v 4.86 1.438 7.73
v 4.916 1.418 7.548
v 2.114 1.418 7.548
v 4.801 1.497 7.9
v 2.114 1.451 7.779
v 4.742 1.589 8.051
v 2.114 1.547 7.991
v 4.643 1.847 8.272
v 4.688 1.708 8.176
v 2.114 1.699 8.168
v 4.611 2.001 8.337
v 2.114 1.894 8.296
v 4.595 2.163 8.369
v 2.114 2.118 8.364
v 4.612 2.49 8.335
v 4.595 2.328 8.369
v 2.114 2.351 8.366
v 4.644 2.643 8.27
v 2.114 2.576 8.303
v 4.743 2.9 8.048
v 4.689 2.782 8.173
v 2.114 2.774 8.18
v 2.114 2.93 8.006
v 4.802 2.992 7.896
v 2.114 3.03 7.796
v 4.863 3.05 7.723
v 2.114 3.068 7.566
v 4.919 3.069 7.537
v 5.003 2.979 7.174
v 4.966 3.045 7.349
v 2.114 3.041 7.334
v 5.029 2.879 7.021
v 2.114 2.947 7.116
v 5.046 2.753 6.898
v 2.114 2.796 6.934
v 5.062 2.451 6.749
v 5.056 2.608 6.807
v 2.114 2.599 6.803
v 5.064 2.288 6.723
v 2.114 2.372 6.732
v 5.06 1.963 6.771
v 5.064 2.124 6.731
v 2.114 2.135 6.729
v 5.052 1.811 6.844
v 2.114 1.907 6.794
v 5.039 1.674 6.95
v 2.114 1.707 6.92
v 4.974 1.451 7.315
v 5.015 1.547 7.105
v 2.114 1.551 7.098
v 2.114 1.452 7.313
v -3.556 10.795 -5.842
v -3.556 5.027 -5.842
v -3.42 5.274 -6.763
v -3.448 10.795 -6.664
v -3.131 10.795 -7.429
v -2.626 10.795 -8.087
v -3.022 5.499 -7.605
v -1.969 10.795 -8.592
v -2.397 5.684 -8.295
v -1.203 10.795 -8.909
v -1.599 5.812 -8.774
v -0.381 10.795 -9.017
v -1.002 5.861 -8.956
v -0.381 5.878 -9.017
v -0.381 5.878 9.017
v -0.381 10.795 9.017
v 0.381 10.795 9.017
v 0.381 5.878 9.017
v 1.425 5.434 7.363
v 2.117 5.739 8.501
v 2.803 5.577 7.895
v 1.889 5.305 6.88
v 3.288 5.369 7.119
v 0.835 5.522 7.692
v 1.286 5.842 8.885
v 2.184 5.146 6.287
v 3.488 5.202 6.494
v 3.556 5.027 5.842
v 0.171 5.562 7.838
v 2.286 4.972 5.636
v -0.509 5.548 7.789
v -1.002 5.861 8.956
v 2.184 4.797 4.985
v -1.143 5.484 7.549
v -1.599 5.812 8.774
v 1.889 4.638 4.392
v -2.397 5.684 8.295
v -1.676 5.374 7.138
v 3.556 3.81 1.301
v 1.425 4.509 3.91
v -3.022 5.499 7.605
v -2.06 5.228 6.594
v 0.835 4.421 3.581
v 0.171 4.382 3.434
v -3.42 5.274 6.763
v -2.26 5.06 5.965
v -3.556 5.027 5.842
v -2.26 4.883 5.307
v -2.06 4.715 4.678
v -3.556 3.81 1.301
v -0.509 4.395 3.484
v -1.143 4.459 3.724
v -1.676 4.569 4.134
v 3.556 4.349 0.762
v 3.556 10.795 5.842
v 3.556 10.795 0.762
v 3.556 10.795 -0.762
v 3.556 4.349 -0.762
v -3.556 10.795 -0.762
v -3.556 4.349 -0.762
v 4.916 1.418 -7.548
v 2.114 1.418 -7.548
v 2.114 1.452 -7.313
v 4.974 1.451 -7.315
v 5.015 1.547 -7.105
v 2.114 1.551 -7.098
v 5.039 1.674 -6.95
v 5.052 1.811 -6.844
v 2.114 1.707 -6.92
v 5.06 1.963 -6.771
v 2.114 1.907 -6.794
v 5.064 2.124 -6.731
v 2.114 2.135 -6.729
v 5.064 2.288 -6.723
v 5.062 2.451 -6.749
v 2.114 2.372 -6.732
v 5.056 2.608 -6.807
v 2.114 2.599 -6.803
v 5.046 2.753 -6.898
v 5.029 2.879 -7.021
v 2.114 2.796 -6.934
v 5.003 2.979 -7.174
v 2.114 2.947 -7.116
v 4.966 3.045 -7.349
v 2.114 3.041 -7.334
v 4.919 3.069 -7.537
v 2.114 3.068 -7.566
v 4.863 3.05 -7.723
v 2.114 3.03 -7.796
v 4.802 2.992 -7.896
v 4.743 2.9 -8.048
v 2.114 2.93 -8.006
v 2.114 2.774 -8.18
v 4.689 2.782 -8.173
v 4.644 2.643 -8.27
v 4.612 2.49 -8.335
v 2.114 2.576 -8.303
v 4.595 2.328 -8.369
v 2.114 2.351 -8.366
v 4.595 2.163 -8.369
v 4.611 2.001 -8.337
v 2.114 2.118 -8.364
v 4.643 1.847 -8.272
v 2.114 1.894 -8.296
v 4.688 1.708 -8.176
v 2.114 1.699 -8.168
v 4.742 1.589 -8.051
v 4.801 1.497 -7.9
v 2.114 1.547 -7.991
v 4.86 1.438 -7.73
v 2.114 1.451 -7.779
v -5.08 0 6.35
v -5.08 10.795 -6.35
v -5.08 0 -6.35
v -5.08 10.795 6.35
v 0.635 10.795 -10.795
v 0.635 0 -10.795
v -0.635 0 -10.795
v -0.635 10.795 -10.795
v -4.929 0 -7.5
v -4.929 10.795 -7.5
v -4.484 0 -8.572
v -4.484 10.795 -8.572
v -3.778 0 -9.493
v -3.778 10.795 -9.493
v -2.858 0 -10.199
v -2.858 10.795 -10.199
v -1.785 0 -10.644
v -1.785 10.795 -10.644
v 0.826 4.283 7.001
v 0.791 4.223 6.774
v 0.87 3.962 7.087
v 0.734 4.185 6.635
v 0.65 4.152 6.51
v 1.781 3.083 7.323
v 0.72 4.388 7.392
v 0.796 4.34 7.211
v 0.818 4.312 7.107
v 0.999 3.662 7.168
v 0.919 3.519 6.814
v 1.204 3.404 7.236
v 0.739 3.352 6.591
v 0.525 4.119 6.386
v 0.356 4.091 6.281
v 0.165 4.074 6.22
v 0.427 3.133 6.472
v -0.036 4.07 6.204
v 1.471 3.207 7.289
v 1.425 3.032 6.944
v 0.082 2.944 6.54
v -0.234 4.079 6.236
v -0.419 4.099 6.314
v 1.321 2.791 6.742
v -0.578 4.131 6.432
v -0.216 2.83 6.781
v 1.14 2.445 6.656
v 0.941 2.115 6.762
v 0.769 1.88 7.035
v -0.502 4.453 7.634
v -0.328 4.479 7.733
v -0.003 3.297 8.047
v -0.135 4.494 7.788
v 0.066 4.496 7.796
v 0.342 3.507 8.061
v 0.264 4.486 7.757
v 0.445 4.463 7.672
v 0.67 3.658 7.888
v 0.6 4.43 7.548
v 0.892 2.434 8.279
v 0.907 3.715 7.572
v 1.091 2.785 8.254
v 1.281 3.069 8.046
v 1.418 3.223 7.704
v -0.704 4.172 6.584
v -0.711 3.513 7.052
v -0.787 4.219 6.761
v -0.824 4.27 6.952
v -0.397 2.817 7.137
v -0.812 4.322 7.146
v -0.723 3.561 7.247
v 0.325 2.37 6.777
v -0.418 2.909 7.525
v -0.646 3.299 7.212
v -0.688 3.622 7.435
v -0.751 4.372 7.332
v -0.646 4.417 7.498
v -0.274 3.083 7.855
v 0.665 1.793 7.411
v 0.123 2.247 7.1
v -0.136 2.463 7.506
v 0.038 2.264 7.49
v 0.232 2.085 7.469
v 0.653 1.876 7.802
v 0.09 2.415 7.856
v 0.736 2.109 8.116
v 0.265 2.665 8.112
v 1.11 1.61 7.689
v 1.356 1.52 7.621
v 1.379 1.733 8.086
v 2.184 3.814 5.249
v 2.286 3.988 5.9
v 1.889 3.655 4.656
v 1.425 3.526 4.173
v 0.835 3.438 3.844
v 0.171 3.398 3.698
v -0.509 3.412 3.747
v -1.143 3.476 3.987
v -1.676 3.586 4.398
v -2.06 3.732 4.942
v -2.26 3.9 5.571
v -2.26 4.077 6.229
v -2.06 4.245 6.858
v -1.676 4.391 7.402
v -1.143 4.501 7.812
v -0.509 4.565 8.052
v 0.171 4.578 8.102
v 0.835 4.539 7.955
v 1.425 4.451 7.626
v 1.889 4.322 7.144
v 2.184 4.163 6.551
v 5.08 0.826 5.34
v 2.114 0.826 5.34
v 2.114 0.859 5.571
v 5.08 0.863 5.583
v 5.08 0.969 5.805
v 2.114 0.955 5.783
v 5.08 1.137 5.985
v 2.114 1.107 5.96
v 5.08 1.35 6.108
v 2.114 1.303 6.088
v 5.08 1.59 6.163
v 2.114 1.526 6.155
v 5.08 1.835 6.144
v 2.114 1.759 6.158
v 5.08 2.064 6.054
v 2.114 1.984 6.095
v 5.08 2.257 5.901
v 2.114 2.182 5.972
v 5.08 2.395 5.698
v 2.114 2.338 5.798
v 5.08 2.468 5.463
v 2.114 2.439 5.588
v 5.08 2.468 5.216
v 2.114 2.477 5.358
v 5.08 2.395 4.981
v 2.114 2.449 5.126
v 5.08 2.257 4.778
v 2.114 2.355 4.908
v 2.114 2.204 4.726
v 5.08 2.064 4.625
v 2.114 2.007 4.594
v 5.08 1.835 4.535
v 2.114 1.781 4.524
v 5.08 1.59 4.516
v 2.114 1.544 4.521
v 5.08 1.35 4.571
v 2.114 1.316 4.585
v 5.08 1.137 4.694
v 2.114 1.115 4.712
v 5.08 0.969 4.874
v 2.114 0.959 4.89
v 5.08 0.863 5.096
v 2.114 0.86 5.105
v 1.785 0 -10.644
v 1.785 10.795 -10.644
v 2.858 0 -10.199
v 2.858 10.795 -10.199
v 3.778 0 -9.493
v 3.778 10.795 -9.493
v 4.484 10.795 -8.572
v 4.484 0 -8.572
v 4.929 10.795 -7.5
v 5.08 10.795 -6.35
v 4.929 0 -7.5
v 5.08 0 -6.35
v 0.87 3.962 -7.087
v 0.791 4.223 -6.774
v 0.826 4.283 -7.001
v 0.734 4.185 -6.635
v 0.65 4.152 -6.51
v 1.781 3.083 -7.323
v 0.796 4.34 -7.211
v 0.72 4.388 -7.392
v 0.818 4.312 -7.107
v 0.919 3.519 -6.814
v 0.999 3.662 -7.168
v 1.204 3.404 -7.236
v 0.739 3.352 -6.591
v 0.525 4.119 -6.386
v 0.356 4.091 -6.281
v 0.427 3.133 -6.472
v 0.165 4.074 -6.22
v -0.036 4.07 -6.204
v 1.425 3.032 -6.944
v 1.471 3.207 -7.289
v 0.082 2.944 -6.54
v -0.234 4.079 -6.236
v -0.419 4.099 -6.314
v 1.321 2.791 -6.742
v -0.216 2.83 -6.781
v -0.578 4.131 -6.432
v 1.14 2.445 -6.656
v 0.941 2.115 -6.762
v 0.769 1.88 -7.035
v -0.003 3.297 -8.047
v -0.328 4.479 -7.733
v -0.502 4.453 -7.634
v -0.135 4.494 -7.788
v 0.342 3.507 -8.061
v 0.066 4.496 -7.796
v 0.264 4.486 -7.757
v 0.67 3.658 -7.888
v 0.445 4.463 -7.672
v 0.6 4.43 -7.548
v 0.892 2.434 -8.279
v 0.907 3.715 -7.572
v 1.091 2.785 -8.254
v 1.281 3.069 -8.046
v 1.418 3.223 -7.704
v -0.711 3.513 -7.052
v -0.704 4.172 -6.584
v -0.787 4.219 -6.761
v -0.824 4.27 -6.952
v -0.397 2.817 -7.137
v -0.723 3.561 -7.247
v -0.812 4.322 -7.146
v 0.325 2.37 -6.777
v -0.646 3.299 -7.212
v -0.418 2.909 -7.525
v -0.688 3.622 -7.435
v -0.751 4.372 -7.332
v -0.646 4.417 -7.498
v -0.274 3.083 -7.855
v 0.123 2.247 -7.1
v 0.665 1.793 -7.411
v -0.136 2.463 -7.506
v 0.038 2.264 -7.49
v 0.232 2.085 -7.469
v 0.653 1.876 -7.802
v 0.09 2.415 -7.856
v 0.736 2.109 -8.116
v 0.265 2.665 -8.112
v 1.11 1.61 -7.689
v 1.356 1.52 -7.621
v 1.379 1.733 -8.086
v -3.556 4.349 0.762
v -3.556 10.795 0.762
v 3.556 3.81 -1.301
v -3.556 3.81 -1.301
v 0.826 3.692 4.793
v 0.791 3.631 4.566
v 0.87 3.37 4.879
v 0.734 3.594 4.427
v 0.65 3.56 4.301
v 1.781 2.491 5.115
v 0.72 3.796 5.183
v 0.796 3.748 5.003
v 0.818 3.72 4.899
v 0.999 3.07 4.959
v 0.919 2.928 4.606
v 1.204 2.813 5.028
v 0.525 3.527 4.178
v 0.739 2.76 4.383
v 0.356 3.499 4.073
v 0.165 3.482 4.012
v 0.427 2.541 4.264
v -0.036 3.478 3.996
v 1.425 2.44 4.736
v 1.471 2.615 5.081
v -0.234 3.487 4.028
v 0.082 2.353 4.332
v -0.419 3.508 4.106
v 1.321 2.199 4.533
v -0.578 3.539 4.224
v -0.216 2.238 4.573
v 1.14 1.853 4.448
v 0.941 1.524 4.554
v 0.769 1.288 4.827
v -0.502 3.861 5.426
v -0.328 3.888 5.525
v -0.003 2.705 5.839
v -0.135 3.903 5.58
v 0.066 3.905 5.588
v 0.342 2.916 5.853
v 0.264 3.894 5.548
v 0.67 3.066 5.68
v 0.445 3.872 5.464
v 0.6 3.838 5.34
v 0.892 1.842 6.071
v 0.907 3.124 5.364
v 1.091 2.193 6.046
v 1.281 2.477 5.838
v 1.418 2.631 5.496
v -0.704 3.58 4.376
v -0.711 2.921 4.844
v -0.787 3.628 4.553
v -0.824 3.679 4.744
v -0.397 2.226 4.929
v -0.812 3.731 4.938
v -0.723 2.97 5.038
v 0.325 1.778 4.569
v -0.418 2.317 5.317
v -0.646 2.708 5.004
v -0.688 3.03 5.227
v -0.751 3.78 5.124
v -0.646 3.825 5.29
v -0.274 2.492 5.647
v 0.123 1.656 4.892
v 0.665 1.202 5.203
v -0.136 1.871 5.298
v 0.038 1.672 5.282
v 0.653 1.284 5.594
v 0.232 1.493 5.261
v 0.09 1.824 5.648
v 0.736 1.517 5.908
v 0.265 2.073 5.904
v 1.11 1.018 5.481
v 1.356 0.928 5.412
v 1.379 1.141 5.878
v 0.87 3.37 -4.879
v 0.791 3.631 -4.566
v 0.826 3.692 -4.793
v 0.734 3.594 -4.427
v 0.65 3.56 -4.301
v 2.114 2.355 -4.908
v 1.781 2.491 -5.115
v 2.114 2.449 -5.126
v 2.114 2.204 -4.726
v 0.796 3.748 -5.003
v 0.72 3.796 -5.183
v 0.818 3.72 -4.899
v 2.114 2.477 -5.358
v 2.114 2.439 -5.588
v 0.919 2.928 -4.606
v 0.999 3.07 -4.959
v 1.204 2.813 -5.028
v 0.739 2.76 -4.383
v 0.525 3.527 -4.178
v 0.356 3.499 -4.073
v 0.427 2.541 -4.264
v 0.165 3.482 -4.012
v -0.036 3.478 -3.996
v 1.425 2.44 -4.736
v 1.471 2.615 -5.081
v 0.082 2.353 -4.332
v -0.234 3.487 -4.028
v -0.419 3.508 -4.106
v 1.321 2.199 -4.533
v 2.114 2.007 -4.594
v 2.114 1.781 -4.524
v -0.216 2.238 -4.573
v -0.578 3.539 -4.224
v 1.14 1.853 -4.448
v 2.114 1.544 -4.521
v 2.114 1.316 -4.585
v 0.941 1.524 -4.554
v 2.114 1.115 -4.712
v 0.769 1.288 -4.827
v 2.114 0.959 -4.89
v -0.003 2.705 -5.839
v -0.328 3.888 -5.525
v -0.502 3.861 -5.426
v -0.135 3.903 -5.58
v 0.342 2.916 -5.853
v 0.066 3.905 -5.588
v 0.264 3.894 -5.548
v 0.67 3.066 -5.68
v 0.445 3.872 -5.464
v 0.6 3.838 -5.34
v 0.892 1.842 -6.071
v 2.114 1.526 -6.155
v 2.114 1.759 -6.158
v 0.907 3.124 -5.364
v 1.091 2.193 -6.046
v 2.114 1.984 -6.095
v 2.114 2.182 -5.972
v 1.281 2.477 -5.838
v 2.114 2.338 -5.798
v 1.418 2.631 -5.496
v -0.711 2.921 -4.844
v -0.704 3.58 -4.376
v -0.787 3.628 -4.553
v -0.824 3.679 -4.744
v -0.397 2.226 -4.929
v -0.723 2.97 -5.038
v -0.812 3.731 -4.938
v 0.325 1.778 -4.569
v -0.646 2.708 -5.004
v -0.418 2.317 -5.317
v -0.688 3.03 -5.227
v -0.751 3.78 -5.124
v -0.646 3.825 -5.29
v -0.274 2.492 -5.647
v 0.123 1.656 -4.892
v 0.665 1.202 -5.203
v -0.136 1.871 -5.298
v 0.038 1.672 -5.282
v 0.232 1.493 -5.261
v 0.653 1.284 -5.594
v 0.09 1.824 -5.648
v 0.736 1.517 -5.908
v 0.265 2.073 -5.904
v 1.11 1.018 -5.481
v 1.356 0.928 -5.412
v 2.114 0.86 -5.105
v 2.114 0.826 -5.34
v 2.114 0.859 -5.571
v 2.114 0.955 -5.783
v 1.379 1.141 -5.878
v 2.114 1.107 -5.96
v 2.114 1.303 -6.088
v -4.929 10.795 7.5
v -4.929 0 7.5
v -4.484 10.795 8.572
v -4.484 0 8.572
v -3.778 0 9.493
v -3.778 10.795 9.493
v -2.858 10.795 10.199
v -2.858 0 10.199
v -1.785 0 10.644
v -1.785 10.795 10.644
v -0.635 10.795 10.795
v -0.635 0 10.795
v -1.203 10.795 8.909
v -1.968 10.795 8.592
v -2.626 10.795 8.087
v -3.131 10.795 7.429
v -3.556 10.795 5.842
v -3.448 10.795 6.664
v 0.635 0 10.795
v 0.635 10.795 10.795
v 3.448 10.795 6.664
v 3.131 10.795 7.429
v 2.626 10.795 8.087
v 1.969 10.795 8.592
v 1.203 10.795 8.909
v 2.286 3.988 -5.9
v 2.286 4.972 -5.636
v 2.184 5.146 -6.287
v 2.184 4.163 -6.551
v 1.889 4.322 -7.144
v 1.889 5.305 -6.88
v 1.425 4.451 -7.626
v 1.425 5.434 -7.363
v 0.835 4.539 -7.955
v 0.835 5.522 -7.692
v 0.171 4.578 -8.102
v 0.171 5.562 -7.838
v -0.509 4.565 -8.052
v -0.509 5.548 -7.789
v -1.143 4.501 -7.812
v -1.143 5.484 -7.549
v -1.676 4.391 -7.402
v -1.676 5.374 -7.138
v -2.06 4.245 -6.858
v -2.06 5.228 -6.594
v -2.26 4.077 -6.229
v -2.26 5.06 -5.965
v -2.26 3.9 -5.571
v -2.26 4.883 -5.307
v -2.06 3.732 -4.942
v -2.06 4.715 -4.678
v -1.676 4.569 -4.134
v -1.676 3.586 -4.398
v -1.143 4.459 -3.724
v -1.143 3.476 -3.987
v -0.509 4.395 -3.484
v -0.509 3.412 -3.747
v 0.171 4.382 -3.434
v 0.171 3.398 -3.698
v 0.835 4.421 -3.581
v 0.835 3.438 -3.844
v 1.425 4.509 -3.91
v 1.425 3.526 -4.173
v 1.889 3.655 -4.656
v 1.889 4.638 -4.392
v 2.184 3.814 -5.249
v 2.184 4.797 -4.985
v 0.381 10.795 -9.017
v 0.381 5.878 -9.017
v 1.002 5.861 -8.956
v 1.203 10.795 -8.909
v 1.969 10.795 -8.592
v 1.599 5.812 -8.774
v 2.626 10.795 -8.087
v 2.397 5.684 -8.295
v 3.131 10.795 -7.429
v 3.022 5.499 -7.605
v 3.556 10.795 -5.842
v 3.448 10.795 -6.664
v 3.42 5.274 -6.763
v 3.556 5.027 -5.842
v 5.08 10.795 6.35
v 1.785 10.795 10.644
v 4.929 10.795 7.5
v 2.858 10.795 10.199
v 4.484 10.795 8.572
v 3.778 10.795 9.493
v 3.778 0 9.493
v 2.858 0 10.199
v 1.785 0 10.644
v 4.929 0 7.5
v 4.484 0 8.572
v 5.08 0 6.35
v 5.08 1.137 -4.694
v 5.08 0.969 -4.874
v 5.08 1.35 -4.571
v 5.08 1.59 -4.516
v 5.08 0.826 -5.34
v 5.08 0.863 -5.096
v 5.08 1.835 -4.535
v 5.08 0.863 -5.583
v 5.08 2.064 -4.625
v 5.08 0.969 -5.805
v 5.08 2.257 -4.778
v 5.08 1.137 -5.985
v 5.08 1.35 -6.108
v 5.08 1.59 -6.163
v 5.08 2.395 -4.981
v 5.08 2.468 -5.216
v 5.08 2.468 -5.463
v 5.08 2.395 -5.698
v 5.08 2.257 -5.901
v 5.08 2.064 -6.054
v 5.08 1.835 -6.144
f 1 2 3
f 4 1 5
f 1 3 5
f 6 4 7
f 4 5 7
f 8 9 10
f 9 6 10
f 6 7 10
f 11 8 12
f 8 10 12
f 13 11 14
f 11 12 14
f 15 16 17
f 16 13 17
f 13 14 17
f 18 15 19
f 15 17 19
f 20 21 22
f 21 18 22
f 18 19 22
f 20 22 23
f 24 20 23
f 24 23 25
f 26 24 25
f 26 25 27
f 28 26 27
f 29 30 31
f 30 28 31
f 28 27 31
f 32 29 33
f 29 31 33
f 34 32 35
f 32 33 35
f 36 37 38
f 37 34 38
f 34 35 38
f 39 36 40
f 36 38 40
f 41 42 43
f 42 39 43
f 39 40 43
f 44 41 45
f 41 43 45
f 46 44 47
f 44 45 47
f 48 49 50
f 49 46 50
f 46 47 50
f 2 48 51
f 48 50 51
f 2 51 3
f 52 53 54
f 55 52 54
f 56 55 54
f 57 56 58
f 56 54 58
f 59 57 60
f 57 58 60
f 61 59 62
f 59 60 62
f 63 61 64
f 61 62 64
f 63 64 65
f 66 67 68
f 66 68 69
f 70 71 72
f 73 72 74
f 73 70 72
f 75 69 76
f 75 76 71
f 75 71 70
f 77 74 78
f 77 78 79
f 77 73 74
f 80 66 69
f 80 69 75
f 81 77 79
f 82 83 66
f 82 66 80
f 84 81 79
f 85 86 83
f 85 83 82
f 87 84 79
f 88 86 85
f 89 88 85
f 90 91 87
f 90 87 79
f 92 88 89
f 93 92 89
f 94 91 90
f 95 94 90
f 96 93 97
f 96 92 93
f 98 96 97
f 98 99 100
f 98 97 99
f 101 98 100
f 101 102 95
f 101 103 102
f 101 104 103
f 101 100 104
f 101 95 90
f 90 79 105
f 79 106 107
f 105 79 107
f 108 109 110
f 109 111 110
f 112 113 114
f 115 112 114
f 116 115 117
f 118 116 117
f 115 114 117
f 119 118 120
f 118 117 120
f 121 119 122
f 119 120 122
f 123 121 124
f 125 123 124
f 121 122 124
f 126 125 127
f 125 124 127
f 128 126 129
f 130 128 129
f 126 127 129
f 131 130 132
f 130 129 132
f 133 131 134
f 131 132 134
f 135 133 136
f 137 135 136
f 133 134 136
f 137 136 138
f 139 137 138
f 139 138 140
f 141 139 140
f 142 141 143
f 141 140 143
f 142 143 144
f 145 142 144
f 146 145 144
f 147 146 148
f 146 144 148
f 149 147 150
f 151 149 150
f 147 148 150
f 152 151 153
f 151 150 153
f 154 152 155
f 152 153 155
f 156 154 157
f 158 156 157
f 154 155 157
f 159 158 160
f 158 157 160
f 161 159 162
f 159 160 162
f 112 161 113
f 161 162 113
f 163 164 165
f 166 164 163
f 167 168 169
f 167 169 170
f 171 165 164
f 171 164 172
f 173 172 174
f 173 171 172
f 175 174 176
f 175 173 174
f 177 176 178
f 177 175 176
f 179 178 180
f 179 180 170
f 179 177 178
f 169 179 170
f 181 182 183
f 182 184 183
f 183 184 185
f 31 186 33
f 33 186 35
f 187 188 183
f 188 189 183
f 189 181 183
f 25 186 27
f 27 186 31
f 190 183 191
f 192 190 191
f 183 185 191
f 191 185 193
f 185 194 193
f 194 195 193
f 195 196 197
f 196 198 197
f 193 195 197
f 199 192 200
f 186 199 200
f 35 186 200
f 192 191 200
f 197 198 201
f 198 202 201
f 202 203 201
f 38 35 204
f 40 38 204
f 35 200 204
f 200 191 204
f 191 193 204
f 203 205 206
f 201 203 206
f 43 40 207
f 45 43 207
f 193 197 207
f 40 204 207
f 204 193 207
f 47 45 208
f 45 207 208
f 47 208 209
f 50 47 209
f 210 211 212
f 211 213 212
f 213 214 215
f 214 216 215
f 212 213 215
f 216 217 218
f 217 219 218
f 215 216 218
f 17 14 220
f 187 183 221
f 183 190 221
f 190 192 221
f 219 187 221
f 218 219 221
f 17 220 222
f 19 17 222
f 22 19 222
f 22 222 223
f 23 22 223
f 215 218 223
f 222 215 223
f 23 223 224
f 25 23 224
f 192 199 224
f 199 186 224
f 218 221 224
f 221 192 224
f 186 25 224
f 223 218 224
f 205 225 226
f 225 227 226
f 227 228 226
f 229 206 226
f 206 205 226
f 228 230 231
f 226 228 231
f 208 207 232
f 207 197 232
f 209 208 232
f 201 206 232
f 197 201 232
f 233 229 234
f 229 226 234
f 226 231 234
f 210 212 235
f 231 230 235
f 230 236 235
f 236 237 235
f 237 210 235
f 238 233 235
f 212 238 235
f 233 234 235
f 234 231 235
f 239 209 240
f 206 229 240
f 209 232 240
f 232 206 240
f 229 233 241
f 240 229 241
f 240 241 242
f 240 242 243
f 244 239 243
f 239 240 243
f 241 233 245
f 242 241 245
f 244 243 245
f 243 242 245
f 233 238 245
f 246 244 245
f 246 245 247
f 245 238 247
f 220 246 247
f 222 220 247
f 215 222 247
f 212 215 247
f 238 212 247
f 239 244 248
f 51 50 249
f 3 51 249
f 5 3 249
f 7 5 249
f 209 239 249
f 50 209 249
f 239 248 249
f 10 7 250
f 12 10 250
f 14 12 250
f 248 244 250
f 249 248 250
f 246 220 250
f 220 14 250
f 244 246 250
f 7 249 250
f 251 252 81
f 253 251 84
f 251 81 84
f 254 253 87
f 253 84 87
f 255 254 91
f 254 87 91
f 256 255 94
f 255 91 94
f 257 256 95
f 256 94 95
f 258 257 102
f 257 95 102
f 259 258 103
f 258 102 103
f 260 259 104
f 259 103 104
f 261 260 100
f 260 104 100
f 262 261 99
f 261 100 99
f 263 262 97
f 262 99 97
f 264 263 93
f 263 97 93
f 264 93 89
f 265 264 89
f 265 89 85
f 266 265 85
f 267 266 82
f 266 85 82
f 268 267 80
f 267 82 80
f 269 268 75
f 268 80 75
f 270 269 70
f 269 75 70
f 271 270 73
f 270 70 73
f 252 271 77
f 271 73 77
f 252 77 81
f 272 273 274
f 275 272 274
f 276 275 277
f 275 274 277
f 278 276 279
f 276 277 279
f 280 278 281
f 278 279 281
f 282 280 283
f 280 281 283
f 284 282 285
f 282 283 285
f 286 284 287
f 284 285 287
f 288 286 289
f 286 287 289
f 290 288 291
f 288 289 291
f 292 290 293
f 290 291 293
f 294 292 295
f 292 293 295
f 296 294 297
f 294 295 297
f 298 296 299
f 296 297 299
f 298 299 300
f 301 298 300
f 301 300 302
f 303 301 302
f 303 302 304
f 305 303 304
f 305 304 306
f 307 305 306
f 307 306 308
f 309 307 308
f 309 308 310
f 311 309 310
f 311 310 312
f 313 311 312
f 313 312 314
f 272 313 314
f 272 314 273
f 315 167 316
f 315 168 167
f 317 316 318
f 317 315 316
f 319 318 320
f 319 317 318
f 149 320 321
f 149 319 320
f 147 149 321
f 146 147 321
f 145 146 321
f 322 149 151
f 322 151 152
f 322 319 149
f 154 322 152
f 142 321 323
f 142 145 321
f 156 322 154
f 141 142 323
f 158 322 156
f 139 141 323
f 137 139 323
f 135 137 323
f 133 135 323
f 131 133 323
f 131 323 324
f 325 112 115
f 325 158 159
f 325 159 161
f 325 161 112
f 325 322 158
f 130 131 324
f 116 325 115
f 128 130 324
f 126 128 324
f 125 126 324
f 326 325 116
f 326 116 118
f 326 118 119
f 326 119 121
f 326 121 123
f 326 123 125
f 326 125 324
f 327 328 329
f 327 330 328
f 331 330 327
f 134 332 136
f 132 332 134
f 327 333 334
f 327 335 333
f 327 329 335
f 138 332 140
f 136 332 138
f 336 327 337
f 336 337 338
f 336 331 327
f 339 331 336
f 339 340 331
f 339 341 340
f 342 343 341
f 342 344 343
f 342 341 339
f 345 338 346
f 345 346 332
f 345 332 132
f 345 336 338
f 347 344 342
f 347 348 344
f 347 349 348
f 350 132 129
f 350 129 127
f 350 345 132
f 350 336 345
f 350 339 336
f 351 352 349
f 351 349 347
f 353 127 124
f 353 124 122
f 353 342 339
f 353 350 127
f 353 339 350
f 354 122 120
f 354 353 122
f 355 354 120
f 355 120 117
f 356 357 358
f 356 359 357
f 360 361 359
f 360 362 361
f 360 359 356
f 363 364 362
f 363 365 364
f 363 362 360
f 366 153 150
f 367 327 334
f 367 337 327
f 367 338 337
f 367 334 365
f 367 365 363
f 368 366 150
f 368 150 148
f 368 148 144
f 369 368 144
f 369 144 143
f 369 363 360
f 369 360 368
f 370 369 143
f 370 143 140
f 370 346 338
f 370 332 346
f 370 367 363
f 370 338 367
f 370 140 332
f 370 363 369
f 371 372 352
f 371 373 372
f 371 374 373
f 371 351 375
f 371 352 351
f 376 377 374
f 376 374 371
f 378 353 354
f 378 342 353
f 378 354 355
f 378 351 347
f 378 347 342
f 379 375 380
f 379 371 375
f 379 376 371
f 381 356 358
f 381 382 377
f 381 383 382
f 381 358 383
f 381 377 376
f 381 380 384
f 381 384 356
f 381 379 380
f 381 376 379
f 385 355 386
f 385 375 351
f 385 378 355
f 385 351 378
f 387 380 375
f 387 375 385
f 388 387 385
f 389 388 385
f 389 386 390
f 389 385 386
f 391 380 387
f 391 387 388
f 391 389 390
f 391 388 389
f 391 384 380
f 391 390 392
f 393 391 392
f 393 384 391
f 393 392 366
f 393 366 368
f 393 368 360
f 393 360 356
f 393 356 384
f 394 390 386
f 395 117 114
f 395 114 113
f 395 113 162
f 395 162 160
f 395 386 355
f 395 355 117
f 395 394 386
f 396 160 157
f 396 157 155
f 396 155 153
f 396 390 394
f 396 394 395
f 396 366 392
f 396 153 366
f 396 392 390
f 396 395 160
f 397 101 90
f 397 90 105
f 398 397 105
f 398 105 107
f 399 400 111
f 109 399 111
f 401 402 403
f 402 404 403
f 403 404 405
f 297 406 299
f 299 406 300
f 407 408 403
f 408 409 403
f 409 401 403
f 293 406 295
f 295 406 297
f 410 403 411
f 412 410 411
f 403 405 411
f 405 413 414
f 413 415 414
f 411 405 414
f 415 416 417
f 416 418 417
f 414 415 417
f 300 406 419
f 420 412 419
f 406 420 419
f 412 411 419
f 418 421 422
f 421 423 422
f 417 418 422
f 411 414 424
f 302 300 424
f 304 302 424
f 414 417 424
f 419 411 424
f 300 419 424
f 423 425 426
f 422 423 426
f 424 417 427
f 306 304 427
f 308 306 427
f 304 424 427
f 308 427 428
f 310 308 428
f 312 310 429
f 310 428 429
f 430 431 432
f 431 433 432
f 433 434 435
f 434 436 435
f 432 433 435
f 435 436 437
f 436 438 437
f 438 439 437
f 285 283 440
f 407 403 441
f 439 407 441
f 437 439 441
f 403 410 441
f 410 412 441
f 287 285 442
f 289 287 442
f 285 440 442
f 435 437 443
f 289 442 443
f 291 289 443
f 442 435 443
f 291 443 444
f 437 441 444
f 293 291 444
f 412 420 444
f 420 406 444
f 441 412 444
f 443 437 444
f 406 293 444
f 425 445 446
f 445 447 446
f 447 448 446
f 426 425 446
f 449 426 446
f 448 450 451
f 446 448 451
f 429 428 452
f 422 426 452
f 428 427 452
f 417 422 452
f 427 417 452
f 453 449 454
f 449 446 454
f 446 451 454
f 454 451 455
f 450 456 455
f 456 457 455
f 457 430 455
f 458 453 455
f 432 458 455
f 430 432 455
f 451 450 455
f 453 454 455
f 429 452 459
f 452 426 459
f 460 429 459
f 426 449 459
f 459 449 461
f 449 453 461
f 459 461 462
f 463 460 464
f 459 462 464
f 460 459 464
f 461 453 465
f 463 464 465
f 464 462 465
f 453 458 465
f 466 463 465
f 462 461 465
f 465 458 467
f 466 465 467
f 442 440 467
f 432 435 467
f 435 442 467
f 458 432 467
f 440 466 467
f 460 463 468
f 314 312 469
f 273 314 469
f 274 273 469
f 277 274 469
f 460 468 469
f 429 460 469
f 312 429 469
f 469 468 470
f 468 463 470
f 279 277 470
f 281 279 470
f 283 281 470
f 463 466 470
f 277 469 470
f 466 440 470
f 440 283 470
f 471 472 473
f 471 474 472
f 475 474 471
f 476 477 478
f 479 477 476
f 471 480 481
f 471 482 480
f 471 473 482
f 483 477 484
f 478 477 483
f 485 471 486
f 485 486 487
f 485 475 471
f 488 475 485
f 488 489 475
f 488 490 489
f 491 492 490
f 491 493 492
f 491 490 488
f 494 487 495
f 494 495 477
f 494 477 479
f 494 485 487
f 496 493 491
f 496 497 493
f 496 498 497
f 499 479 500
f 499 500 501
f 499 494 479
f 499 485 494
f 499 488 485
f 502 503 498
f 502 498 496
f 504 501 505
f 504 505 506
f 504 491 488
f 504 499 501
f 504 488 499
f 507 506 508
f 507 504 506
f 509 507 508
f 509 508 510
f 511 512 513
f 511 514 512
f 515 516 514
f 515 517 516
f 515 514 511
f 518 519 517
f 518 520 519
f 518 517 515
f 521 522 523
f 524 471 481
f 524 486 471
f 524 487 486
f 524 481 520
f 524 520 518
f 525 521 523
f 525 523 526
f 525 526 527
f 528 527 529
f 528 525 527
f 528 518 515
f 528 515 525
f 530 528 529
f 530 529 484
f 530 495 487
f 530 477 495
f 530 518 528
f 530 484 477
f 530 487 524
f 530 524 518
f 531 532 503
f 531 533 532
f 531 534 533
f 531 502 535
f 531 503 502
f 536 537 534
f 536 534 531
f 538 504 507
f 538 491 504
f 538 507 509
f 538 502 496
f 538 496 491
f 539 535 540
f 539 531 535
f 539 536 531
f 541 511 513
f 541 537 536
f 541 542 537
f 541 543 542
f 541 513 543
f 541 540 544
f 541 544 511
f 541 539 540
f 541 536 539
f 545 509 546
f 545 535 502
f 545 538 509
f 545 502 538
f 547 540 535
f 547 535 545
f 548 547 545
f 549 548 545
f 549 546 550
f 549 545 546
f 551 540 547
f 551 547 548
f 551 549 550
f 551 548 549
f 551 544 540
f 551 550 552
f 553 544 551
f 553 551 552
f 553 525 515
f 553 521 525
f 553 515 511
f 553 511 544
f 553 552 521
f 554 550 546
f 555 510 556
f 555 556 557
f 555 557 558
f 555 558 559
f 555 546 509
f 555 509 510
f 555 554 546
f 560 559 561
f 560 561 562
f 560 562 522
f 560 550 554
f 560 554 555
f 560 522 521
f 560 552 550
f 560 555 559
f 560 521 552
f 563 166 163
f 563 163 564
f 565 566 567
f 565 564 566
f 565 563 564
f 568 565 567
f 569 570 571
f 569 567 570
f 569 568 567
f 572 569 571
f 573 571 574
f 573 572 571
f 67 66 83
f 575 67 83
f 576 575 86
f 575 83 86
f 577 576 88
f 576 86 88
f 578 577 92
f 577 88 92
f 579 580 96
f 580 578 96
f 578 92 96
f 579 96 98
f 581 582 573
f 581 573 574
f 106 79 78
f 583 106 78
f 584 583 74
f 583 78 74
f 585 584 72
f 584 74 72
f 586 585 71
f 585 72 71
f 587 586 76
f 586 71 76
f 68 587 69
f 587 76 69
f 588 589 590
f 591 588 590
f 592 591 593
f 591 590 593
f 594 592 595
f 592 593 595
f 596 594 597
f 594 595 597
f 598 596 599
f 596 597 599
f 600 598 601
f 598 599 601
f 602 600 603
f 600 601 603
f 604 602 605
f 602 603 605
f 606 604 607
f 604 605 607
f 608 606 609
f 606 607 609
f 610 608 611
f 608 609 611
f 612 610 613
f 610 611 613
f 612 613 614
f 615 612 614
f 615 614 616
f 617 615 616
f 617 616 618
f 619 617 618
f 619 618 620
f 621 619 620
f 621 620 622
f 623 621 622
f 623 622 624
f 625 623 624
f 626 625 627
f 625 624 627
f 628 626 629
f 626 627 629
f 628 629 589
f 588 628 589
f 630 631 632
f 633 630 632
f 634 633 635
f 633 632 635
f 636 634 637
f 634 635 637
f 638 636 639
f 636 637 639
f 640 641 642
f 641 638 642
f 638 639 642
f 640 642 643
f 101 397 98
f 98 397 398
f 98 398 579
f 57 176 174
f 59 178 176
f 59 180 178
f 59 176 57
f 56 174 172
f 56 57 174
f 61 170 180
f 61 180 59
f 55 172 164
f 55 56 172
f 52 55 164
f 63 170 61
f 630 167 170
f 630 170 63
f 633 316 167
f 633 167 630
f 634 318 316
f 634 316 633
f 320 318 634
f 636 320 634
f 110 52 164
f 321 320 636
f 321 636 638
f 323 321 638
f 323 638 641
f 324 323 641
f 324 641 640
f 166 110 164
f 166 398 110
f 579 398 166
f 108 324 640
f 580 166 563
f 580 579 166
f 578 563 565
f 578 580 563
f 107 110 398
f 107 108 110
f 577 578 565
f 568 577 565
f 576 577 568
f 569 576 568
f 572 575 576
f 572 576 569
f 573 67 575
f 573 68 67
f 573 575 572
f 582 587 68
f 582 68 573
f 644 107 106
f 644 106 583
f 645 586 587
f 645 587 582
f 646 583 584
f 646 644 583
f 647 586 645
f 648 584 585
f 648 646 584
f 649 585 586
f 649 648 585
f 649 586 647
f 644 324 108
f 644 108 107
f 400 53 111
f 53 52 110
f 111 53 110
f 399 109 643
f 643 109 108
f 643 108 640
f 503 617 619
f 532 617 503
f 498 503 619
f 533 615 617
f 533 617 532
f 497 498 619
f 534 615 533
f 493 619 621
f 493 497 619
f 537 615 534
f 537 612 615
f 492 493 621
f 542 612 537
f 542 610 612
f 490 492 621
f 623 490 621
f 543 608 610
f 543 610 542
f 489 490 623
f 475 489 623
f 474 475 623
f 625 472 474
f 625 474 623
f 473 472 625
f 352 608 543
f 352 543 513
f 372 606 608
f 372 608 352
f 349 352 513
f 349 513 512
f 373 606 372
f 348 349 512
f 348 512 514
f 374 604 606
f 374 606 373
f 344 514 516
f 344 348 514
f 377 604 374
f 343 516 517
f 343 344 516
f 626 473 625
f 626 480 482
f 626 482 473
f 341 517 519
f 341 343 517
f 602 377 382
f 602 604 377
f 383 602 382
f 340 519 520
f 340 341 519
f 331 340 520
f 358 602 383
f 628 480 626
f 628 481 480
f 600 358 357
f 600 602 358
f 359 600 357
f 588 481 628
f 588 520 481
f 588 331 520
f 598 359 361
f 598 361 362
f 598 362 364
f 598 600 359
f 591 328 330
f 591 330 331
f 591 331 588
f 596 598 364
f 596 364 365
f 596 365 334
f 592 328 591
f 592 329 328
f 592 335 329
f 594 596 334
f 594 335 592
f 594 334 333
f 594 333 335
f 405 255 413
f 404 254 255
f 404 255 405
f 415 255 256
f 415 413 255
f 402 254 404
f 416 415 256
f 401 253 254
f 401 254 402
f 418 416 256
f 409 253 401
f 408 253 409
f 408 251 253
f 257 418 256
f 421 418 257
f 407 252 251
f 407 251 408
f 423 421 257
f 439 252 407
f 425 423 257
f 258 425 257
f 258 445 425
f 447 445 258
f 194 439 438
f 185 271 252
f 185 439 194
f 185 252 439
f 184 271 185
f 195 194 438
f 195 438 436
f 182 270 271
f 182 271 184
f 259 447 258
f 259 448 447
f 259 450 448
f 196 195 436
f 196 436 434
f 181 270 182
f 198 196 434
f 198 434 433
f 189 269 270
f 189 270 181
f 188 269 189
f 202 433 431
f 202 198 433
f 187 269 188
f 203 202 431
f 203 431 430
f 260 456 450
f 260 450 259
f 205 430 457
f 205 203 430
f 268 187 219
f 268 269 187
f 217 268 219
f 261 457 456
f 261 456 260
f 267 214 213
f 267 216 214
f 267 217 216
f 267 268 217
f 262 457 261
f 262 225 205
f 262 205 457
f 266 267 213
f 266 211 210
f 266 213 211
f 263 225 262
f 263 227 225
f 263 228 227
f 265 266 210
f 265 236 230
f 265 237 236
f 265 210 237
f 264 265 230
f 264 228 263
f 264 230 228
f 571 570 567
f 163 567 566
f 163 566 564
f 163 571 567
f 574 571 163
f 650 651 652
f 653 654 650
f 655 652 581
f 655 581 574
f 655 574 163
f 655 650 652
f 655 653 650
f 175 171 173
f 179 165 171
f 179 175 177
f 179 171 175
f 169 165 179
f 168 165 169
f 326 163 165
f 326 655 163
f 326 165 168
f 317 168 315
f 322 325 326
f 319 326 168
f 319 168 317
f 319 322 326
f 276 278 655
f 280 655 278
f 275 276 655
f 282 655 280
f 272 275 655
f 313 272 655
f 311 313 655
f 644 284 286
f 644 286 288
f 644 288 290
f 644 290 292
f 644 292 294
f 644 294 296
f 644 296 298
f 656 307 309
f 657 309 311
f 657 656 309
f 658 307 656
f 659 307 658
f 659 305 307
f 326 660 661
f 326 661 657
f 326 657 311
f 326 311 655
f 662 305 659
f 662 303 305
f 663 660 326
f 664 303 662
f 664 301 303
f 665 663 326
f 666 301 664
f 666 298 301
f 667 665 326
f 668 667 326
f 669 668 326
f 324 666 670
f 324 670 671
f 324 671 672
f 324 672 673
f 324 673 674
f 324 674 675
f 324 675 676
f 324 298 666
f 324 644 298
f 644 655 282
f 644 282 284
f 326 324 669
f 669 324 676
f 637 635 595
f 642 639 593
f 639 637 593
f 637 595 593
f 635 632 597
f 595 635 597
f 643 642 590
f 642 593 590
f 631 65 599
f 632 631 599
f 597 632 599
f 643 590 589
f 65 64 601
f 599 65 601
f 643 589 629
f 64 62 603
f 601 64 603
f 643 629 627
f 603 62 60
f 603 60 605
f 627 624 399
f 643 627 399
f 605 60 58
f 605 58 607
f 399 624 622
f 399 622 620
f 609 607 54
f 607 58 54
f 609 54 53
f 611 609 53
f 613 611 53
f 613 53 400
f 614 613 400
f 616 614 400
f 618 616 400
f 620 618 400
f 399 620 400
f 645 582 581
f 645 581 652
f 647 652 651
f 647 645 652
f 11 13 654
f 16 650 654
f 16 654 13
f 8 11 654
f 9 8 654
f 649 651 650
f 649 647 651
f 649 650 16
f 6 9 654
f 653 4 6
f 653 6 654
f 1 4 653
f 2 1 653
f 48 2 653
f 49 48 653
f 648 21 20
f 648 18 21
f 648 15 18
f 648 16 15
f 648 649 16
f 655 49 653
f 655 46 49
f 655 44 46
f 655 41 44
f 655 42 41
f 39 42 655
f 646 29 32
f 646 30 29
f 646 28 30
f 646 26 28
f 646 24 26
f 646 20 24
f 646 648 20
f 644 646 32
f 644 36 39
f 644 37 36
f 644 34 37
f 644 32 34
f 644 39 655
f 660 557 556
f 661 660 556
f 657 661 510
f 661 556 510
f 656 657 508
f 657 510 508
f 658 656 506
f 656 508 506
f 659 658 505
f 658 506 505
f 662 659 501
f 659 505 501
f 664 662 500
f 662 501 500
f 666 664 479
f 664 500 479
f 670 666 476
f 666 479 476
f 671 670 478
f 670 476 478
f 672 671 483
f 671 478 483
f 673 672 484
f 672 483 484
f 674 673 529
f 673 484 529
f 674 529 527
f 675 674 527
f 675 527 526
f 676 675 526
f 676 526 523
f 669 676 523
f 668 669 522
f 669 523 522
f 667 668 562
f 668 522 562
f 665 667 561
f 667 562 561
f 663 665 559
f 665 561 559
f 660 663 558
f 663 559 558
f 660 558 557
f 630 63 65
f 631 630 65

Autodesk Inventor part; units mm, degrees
ref_plane "YZ Plane" through (0, 0, 0) normal (1, 0, 0) x (0, 1, 0)
ref_plane "XZ Plane" through (0, 0, 0) normal (0, 1, 0) x (-1, 0, 0)
sketch "Sketch1" plane through (0, 0, 0) normal (1, 0, 0) x (0, 1, 0)
  line L0 (0, 0) -> (0, 10.795)
  line L1 (0, 10.795) -> (10.795, 10.795)
  line L2 (10.795, 10.795) -> (10.795, 9.017)
  line L3 (10.795, 9.017) -> (5.8775, 9.017)
  line L4 (5.8775, 9.017) -> (3.81, 1.3008)
  line L5 (4.3488, 0.762) -> (10.795, 0.762)
  line L6 (10.795, 0.762) -> (10.795, 0)
  line L7 (0, 0) -> (10.795, 0) construction
  line L8 (3.81, 1.3008) -> (4.3488, 0.762)
  line L9 (0, 0) -> (0, -10.795)
  line L10 (0, -10.795) -> (10.795, -10.795)
  line L11 (10.795, -10.795) -> (10.795, -9.017)
  line L12 (10.795, -9.017) -> (5.8775, -9.017)
  line L13 (5.8775, -9.017) -> (3.81, -1.3008)
  line L14 (4.3488, -0.762) -> (10.795, -0.762)
  line L15 (10.795, -0.762) -> (10.795, 0)
  line L16 (3.81, -1.3008) -> (4.3488, -0.762)
  dimension "d0" = 10.795
  dimension "d1" = 105
  dimension "d8" = 0.762
  dimension "d33" = 3.81
  dimension "d34" = 10.795
  dimension "d35" = 0.762
  dimension "d36" = 1.778
extrude "Extrusion1" add sketch "Sketch1" along normal mid plane 7.112
sketch "Sketch2" plane through (3.556, 0, 0) normal (1, 0, 0) x (0, 0, -1)
  line L0 (-10.795, 10.795) -> (10.795, 10.795)
  line L1 (10.795, 10.795) -> (10.795, 0)
  line L2 (10.795, 0) -> (-10.795, 0)
  line L3 (-10.795, 0) -> (-10.795, 10.795)
  point P0 (0, 0)
extrude "Extrusion2" add sketch "Sketch2" along normal blind 1.524
ref_plane "Work Plane1" through (0, 0, 0) normal (-1, 0, 0) x (0, 0, 1)
mirror "Mirror1" about plane through (0, 0, 0) normal (-1, 0, 0) of "Extrusion2"
ref_plane "Work Plane2" through (3.556, 5.8775, 0) normal (0, 0, 1) x (1, 0, 0)
sketch "Sketch3" plane through (-3.556, 3.81, -1.3008) normal (0, 0.9659258, 0.258819) x (1, 0, 0)
  circle A0 centre (3.556, 4.4884) radius 2.286
  line L0 (3.556, -2.2426) -> (3.556, 4.4884) construction
  line L1 (7.112, 1.2874) -> (0, 1.2874) construction
  dimension "d14" = 4.572
  dimension "d15" = 6.731
extrude "Extrusion3" cut sketch "Sketch3" against normal blind 1.016
mirror "Mirror2" about plane through (3.556, 5.8775, 0) normal (0, 0, 1) of "Extrusion3"
fillet "Fillet4" radius 3.175 4 edges at (3.556, 8.3363, -9.017) (-3.556, 8.3363, -9.017) (3.556, 8.3363, 9.017) (-3.556, 8.3363, 9.017)
fillet "Fillet5" radius 4.445 4 edges at (5.08, 5.3975, 10.795) (5.08, 5.3975, -10.795) (-5.08, 5.3975, -10.795) (-5.08, 5.3975, 10.795)
sketch "Sketch4" plane through (0, 3.9903, 5.8992) normal (0, 0.9659258, -0.258819) x (1, 0, 0)
  line L0 (0, 0.0029) -> (0, -1.1401) construction
  line L1 (0, 0.0029) -> (0, 1.1459) construction
  line L2 (0, 0.0029) -> (0, -1.1079) construction
  circle A0 centre (0, 1.1459) radius 0.8255
  circle A1 centre (0, -1.1401) radius 0.8255
  line L3 (2.1143, 0.0029) -> (2.1143, 2.2658) construction
  point P0 (0, 6.731)
  dimension "d43" = 1.143
  dimension "d44" = 1.651
revolve "Revolution1" cut sketch "Sketch4" angle 90 about axis through (2.1143, 3.9896, 5.8964) along (0, 0.258819, 0.9659258)
mirror "Mirror3" about plane through (3.556, 5.8775, 0) normal (0, 0, 1) of "Revolution1"
sketch "Sketch6" plane through (2.1143, 4.7773, -7.6581) normal (-1, 0, 0) x (0, -1, 0)
  circle A0 centre (2.5341, 0.1105) radius 0.8255 projected
  circle A1 centre (2.5341, 0.1105) radius 0.8255
  circle A2 centre (3.1258, 2.3186) radius 0.8255 projected
  circle A3 centre (3.1258, 2.3186) radius 0.8255
  point P0 (4.7773, 7.6581)
extrude "Extrusion6" cut sketch "Sketch6" against normal up to next
mirror "Mirror10" about plane through (3.556, 5.8775, 0) normal (0, 0, 1) of "Extrusion6"
equation "\"d0\" = 0.5 * Base_Length"
equation "\"d1\" = Sensor_Angle"
equation "\"d33\" = Base_Thickness"
equation "\"d34\" = Mount_Height"
equation "\"d14\" = LED_Base"
equation "\"d15\" = Hole_to_Center"
equation "\"d18\" = Wire_Spacing"
equation "\"Wire_Spacing\" = 1.143"
equation "\"Wire_Diameter\" = 1.651"
equation "\"LED_Base\" = 4.572"
equation "\"Mount_Space\" = 16.51"
equation "\"Mount_Clearance\" = 3.175"
equation "\"Mount_Height\" = 10.795"
equation "\"Base_Length\" = 21.59"
equation "\"Base_Width\" = 10.16"
equation "\"Sensor_Angle\" = 105deg"
equation "\"Base_Thickness\" = 3.81"
equation "\"Hole_to_Center\" = 6.731"
equation "\"Tape_Width\" = 2.54"
properties part number "Line Tracker v3" material "PLA Plastic"
